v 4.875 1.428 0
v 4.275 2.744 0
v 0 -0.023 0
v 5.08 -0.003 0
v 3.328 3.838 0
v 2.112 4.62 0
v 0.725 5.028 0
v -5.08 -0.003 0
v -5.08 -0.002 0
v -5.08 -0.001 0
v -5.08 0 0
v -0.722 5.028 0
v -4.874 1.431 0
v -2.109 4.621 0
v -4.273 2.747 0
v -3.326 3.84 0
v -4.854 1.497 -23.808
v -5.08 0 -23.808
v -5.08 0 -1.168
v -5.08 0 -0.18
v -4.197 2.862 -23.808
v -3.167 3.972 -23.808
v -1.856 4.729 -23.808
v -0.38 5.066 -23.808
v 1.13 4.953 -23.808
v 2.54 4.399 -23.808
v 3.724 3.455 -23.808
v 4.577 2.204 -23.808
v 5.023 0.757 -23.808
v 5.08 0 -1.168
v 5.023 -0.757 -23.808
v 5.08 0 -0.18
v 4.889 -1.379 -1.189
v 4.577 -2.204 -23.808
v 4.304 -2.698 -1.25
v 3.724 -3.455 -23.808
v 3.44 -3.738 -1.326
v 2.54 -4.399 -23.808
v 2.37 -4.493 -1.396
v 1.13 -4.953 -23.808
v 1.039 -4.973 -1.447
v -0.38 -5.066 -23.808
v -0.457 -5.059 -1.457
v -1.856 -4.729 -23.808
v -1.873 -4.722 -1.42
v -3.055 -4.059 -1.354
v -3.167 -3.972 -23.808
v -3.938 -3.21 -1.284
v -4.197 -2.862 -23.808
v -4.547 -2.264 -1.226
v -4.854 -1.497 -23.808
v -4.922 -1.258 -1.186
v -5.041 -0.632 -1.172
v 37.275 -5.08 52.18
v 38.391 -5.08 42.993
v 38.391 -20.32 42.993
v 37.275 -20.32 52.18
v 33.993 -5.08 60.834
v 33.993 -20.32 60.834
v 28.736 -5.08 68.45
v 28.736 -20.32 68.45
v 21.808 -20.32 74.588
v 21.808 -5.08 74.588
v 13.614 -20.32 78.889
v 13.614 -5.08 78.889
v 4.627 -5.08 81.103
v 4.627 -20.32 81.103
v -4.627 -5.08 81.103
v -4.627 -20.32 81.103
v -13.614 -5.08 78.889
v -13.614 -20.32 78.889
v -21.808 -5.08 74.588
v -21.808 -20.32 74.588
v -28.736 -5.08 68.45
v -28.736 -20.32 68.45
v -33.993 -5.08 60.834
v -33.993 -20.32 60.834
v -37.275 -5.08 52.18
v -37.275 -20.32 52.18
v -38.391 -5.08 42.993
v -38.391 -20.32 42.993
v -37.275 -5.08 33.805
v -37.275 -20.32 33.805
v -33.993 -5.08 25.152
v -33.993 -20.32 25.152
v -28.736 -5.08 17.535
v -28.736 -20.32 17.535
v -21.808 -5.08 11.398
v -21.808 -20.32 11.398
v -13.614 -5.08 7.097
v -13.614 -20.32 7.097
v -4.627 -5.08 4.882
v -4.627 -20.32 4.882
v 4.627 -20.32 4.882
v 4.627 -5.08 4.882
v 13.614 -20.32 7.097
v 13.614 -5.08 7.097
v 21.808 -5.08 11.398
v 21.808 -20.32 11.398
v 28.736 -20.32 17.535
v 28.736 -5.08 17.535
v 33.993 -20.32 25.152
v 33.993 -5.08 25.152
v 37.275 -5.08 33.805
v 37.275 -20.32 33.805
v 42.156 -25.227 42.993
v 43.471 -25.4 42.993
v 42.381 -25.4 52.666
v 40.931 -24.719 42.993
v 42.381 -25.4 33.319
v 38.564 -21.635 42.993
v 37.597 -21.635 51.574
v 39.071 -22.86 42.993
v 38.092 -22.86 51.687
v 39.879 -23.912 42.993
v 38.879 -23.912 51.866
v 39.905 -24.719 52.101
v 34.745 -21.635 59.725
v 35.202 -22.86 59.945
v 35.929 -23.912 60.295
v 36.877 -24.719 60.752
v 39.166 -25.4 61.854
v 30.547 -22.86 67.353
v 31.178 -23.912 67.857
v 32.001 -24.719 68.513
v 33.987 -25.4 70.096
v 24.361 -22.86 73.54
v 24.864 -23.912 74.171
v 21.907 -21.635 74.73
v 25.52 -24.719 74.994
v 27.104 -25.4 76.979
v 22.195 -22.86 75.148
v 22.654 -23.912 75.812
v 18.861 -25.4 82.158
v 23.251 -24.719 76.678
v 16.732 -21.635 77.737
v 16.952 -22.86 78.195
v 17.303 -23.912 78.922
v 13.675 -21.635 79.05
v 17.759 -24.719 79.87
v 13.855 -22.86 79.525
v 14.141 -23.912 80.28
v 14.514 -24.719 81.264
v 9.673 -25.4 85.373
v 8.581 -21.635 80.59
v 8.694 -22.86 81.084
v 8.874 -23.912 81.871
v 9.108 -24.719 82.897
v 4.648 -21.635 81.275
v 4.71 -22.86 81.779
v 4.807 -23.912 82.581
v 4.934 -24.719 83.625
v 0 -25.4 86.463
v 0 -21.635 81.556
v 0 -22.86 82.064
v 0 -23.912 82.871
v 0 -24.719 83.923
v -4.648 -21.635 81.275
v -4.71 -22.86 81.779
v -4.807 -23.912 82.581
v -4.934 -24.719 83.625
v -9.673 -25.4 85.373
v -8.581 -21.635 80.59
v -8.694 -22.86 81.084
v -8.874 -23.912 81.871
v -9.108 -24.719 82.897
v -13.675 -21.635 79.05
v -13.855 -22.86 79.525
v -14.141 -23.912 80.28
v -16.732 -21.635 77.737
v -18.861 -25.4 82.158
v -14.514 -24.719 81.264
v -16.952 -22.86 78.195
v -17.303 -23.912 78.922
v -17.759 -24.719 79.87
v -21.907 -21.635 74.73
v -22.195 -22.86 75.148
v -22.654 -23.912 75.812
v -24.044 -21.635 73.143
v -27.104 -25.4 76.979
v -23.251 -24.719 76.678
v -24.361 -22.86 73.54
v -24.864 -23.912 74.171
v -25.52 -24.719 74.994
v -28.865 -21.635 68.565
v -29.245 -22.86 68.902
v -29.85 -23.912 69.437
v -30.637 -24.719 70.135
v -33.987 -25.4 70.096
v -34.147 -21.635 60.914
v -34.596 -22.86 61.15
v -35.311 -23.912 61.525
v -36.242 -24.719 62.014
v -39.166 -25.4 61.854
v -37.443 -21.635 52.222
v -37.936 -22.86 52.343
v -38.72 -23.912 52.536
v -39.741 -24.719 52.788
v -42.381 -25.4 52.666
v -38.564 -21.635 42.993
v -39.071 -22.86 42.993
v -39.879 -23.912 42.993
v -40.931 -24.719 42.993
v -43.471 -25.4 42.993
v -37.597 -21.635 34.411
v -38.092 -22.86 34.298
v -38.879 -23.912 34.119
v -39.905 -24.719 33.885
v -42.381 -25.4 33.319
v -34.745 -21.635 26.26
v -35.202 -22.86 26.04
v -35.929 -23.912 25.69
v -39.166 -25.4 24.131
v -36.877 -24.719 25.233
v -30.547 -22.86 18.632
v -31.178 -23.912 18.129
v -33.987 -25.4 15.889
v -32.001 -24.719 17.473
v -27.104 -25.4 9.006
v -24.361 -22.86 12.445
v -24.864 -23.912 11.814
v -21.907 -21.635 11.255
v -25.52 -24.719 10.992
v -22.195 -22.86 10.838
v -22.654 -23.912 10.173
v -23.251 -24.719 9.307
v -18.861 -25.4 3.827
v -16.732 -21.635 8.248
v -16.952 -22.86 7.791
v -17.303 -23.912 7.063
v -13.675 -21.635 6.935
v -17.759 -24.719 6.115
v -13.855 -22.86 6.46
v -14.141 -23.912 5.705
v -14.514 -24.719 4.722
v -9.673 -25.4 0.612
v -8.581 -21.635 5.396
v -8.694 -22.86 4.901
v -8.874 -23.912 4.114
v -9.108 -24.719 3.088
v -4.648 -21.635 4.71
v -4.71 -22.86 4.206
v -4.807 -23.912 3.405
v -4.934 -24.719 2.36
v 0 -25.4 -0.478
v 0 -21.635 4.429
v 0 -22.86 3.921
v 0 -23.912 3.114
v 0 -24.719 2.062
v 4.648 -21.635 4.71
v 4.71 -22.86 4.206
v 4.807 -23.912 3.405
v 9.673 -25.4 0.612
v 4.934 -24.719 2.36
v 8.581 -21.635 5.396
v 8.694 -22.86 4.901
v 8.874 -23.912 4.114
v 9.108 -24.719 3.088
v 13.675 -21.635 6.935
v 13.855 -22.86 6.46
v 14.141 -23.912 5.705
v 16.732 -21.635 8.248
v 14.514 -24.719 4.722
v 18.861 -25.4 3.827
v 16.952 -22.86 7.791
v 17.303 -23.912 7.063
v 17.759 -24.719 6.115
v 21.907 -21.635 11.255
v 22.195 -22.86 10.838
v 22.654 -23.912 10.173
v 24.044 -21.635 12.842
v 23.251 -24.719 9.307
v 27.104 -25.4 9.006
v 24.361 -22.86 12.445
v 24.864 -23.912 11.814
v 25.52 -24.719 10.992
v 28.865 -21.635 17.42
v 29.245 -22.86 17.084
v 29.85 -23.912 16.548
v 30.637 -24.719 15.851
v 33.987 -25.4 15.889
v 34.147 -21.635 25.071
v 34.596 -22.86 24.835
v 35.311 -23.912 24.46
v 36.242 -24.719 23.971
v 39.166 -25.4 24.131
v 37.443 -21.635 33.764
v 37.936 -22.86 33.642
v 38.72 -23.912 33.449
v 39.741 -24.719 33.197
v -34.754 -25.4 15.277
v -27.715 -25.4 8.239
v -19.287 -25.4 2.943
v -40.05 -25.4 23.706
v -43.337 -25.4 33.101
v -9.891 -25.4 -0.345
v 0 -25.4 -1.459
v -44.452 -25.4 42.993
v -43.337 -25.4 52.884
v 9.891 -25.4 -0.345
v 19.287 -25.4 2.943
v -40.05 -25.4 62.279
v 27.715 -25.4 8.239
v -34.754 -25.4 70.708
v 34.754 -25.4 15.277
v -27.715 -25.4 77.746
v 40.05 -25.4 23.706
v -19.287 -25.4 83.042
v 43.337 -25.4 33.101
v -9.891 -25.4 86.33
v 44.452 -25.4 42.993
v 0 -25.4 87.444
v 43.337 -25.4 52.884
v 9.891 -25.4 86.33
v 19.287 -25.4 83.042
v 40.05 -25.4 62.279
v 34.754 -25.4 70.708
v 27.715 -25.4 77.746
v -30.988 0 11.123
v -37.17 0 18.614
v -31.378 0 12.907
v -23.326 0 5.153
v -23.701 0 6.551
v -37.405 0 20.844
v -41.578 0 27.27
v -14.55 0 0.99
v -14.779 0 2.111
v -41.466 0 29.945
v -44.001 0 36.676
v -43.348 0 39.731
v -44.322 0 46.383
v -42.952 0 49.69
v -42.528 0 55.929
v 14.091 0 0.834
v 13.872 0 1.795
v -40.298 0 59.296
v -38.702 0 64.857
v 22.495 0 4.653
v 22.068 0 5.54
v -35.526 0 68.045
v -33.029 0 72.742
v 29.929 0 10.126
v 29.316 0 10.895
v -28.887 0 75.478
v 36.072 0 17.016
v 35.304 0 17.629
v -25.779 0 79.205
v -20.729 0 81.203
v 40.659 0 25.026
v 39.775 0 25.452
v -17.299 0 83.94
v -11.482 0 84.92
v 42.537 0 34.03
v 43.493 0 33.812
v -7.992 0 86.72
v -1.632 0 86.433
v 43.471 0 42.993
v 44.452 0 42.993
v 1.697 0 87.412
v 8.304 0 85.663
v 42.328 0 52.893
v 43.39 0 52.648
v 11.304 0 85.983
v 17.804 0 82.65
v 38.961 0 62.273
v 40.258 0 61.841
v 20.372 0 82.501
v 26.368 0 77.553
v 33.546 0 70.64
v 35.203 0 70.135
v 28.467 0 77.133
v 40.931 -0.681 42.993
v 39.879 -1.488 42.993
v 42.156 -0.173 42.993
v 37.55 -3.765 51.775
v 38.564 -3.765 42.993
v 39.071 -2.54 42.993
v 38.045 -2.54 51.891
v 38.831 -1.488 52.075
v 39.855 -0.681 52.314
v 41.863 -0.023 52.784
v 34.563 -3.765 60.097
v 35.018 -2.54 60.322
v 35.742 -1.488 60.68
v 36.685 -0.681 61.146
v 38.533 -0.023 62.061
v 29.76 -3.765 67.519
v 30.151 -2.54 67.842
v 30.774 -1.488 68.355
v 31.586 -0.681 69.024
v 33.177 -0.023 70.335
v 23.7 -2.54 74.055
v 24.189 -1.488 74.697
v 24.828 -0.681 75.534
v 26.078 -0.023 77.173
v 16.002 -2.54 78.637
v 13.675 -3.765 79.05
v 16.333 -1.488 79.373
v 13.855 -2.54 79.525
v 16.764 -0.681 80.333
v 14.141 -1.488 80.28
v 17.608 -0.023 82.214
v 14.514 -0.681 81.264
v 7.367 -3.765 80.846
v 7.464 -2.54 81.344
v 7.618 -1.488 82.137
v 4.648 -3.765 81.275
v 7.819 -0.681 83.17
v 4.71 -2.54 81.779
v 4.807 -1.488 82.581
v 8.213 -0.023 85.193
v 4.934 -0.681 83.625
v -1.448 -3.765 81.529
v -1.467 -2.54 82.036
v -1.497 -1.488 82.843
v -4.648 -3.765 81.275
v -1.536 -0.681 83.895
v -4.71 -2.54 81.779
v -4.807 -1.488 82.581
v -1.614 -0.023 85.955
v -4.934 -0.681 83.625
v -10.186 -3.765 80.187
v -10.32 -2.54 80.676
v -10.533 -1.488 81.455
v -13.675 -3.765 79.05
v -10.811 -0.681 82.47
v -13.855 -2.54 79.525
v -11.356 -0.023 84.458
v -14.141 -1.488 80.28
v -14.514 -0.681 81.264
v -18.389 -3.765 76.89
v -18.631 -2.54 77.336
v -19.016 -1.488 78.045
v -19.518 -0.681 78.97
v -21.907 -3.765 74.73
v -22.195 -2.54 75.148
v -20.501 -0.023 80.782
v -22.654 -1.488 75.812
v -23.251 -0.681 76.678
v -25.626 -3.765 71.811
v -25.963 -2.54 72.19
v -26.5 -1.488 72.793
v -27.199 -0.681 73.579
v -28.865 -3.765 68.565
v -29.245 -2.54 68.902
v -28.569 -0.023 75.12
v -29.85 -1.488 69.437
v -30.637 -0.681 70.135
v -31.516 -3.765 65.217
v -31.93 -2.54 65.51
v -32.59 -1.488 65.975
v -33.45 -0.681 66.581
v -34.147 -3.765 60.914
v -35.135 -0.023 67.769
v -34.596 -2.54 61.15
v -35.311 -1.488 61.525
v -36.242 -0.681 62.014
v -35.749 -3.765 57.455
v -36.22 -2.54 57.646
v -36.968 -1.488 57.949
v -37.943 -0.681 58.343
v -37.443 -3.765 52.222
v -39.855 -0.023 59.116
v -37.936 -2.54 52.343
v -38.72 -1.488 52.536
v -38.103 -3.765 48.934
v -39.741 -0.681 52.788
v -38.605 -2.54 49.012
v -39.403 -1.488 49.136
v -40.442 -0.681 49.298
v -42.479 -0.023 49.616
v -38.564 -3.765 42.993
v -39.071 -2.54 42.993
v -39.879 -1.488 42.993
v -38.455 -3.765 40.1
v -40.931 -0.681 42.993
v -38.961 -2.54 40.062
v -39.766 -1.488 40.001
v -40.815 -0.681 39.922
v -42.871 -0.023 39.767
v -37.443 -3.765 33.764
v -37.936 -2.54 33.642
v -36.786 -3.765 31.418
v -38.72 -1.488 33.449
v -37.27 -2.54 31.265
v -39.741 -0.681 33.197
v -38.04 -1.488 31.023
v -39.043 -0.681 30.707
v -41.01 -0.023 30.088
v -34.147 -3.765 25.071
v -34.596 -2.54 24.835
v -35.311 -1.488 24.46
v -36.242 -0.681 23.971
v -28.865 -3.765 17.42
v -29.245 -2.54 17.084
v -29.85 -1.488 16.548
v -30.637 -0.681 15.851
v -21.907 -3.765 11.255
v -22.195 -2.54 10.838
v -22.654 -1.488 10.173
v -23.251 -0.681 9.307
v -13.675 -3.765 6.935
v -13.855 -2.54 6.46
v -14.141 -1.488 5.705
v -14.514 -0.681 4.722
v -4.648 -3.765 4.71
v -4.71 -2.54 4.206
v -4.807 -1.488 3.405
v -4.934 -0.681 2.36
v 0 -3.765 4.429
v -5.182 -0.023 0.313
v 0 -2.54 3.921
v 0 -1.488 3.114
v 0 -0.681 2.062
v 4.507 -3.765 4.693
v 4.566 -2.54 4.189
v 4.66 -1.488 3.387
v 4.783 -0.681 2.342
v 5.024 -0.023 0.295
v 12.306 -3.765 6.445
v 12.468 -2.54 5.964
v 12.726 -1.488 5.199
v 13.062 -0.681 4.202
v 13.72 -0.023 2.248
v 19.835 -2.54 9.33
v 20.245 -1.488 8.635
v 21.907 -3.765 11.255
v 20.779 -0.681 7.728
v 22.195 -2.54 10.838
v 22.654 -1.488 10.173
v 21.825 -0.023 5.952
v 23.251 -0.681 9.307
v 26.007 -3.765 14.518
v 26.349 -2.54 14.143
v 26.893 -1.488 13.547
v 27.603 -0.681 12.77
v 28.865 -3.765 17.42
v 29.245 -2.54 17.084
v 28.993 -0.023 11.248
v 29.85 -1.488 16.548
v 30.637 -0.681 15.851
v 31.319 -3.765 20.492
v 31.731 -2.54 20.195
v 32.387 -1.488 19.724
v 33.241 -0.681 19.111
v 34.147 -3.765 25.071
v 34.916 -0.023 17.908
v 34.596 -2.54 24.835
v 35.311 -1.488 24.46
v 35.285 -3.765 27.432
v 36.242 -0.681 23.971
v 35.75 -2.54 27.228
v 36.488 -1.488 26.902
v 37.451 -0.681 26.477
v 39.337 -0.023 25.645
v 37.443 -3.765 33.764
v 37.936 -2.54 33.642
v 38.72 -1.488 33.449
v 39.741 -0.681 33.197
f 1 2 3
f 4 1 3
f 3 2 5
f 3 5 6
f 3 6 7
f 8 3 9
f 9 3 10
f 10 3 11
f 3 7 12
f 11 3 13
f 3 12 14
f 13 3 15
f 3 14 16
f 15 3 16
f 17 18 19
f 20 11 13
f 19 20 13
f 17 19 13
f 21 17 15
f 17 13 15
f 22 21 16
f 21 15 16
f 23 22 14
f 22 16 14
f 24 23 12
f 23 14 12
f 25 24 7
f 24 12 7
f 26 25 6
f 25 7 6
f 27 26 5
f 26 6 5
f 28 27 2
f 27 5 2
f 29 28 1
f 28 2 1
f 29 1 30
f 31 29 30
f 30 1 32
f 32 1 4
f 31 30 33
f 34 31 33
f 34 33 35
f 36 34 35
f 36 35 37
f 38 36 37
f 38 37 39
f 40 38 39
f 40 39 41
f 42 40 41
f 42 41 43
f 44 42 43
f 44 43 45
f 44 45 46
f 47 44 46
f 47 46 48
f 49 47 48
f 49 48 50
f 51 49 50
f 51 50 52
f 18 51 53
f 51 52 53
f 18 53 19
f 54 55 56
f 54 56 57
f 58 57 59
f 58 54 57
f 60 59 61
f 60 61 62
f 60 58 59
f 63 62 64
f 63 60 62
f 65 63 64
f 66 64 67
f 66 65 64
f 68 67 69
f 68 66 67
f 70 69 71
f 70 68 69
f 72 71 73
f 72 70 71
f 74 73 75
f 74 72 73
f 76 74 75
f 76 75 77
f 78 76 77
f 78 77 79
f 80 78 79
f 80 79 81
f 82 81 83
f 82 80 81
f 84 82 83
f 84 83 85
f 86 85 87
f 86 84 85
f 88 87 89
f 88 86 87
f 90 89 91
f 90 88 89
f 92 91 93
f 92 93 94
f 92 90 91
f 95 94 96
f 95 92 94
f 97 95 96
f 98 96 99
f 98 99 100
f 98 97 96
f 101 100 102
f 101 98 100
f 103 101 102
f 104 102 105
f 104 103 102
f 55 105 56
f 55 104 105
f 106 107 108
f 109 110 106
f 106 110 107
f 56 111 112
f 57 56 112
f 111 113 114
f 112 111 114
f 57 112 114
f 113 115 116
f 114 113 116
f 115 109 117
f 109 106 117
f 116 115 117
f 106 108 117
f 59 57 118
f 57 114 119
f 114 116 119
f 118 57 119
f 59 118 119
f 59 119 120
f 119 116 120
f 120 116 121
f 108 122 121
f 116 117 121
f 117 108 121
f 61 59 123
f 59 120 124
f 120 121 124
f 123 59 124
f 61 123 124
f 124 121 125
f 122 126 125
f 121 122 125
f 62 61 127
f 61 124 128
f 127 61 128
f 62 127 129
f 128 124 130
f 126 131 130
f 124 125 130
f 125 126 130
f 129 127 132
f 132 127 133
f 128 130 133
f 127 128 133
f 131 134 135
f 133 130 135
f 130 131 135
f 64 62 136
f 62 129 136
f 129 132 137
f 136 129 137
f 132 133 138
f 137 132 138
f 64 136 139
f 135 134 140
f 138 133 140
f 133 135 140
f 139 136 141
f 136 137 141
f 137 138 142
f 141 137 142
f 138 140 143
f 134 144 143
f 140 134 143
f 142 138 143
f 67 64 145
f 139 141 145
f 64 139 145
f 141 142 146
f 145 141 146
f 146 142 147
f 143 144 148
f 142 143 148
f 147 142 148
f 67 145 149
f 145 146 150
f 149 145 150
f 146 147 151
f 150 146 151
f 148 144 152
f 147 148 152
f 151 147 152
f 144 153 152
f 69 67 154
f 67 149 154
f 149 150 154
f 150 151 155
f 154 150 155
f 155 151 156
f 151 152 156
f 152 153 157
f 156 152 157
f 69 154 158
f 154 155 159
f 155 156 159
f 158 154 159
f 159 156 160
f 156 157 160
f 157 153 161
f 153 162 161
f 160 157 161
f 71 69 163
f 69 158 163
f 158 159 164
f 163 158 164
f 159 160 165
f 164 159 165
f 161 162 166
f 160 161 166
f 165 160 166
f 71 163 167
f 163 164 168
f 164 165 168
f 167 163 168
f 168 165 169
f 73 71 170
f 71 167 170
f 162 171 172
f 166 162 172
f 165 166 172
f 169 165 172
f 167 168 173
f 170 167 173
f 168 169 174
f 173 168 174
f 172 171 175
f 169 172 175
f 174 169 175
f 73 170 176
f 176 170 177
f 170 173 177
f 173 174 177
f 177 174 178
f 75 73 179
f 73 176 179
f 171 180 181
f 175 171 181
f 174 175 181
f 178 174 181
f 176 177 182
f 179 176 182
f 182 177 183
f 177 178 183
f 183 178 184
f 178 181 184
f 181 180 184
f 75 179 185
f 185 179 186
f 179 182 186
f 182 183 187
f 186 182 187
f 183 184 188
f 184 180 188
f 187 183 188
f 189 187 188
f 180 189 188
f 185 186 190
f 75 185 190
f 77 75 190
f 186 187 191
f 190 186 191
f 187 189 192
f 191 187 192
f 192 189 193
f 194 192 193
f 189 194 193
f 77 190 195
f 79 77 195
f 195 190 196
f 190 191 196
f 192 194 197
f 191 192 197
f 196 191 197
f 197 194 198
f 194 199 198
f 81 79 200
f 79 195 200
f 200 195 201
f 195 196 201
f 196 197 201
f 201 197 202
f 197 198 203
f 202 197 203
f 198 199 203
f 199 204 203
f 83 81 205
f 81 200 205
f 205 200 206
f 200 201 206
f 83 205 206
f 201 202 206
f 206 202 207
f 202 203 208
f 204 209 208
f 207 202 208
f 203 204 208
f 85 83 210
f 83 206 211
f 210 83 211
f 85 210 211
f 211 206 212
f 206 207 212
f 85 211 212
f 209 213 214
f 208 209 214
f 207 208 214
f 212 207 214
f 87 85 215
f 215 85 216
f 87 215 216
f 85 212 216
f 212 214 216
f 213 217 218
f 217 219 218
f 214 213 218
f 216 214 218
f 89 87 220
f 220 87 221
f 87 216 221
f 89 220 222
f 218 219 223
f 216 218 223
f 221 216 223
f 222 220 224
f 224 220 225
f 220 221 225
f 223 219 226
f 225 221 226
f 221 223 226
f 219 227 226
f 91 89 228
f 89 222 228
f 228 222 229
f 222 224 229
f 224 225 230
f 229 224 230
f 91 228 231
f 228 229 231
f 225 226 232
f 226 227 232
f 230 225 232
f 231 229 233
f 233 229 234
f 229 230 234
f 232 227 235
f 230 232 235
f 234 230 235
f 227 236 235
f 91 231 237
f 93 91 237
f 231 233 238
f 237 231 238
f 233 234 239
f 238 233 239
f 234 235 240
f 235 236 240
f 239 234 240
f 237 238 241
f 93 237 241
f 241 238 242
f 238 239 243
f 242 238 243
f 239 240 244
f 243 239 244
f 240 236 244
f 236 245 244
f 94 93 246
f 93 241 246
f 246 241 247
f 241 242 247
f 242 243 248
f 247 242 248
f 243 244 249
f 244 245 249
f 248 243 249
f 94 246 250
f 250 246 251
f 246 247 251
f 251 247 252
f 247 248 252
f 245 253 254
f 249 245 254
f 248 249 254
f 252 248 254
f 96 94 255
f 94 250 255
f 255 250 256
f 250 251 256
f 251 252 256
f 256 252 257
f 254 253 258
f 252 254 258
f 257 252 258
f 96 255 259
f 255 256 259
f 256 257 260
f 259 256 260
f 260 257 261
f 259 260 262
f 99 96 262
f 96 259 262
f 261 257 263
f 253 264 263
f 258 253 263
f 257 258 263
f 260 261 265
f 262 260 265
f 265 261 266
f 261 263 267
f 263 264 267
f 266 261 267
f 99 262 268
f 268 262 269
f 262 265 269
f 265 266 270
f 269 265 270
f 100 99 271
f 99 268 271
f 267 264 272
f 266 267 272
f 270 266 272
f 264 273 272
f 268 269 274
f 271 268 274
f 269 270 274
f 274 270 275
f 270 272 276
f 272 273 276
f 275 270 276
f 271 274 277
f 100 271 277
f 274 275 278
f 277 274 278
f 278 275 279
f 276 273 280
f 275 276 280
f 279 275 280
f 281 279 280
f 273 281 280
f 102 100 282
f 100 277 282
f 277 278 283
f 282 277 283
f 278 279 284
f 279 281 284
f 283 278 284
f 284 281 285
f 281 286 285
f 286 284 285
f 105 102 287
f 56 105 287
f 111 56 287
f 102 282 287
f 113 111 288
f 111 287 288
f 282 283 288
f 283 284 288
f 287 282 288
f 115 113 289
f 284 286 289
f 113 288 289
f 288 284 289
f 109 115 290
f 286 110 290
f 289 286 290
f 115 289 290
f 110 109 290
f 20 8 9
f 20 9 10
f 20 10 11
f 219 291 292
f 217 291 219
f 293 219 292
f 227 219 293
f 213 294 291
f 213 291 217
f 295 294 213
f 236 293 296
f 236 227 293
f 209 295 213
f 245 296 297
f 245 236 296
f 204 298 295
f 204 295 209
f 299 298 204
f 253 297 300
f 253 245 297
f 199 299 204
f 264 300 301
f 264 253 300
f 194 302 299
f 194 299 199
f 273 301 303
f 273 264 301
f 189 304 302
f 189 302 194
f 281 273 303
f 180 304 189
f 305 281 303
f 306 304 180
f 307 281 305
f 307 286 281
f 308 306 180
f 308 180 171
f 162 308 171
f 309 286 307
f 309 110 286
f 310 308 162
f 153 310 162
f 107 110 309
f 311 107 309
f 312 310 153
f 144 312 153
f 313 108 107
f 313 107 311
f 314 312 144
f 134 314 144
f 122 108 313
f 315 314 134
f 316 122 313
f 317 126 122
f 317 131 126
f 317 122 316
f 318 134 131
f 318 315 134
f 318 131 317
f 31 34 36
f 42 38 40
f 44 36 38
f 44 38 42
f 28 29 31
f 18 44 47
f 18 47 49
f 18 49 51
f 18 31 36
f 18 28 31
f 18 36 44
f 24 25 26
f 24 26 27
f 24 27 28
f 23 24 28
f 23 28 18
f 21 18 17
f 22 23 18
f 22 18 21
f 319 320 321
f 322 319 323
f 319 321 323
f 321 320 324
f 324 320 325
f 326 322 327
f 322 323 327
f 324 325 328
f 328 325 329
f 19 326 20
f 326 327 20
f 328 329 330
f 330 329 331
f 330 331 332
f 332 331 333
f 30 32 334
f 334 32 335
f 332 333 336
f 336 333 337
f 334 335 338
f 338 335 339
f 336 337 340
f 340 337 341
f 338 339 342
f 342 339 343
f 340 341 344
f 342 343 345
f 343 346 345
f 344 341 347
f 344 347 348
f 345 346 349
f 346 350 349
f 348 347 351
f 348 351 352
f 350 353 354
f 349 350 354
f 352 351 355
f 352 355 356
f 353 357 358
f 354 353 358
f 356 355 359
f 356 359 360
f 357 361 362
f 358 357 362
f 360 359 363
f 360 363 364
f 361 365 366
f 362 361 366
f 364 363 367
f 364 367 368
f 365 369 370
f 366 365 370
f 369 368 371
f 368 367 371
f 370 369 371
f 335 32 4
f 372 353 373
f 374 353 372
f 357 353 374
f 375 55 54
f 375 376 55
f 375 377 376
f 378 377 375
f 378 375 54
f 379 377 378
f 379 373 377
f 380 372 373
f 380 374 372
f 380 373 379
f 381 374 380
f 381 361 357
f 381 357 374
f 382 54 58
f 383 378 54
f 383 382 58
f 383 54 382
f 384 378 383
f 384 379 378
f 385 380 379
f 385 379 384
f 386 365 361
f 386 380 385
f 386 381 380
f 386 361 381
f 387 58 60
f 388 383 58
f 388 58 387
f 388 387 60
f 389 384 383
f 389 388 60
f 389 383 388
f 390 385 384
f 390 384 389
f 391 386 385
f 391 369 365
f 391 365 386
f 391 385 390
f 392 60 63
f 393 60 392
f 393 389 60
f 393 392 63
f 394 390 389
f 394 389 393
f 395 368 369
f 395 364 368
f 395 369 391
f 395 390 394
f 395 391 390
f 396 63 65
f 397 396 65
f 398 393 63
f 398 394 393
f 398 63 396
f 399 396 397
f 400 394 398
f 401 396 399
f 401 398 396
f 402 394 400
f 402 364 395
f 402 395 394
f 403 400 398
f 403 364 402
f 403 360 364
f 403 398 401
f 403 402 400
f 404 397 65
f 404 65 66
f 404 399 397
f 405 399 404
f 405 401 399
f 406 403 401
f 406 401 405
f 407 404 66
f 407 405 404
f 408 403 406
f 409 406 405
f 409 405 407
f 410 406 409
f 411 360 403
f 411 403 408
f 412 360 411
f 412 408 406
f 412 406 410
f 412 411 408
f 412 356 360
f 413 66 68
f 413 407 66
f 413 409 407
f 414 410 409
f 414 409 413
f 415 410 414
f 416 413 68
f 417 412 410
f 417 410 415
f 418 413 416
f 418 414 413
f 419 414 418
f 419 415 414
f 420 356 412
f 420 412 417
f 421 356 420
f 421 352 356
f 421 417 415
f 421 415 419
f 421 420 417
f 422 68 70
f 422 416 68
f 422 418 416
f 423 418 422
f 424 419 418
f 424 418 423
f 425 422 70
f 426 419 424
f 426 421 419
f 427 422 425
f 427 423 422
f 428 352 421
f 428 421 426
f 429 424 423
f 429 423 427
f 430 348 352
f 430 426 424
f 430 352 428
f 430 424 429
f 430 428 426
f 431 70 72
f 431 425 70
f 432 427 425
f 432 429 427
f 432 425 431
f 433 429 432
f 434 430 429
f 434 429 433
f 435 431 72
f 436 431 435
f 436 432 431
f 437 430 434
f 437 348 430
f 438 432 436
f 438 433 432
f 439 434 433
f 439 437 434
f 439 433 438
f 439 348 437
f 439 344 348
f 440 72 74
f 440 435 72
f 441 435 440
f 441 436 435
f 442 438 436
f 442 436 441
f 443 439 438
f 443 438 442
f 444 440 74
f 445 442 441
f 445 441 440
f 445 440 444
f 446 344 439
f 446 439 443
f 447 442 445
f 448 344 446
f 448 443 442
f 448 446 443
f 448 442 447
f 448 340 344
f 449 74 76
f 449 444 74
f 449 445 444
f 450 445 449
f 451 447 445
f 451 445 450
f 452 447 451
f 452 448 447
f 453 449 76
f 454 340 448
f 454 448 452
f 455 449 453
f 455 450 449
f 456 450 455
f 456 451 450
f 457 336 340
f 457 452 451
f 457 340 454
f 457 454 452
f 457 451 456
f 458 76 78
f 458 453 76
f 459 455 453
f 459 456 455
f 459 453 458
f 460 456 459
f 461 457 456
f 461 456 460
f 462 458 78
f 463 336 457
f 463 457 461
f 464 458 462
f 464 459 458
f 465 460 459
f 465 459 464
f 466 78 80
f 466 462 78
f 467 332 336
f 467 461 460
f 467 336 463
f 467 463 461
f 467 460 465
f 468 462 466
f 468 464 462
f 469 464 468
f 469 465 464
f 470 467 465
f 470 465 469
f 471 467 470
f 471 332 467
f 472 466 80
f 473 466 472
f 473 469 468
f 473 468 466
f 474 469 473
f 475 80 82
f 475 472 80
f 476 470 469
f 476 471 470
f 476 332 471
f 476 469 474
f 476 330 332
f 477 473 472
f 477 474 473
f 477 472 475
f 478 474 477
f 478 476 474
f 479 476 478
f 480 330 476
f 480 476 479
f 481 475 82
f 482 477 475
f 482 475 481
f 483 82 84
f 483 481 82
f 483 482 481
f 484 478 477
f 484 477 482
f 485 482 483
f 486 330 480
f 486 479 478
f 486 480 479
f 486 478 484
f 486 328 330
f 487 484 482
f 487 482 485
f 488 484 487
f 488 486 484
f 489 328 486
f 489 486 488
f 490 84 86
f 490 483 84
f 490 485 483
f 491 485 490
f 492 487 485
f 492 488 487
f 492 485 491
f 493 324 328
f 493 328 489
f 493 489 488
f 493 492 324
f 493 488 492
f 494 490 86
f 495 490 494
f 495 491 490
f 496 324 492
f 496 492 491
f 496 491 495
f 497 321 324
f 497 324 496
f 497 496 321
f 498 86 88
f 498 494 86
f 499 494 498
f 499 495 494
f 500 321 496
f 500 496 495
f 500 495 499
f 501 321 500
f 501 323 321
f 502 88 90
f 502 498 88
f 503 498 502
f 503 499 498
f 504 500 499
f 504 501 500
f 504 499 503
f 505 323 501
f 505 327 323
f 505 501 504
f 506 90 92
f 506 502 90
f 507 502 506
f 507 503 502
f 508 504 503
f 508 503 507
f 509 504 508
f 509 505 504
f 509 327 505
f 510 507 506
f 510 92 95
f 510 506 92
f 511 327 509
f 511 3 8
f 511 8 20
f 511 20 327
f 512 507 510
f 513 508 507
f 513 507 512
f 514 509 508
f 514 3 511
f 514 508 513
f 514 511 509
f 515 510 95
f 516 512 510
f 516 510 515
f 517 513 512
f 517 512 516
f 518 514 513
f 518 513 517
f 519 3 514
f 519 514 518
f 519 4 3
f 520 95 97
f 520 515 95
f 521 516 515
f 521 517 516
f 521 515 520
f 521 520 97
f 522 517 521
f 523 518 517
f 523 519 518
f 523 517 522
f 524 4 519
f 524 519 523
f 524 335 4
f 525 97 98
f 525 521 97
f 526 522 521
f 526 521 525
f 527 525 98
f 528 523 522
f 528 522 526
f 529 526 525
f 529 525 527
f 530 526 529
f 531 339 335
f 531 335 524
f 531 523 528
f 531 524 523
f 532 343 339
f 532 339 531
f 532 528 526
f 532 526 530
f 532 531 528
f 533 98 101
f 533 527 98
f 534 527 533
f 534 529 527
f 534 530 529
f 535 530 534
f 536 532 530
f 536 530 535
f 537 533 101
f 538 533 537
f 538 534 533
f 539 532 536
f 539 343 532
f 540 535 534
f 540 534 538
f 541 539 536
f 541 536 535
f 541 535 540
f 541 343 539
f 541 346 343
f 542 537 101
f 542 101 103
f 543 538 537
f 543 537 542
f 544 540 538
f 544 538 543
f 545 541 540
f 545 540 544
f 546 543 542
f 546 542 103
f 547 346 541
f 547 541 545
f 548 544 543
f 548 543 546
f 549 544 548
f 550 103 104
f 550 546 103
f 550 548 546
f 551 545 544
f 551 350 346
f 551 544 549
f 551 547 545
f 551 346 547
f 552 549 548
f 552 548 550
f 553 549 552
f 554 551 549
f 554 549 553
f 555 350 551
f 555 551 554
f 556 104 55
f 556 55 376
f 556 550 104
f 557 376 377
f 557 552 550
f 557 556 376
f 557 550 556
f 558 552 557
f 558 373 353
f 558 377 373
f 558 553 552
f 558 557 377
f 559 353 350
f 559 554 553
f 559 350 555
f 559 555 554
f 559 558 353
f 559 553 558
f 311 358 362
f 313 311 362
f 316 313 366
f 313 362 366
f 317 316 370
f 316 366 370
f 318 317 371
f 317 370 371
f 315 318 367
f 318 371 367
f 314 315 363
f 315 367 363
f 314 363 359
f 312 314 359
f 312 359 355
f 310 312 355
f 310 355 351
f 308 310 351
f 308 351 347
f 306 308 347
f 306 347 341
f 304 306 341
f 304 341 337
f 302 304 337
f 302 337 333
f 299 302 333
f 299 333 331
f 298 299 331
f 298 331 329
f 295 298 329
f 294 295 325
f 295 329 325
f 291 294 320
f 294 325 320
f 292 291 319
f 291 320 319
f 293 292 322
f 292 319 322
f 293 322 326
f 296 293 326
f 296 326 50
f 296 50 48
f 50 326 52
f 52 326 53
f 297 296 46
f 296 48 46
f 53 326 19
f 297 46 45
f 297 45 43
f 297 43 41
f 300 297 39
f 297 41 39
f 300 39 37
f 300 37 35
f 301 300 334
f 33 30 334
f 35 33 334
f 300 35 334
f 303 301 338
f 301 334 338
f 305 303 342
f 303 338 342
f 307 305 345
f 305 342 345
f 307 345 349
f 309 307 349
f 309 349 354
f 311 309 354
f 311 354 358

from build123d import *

# Parameters (mm, degrees)
F0_R     = 44.451674
F0_R_2   = 38.390752
F1_DEPTH = 25.4
F2_R     = 5.08
F3_W     = 5.08
F3_H     = 23.807657


with BuildPart() as f1:
    # F0 (on Front) → F1 (new body)
    with BuildSketch(Plane.XZ):
        with Locations((0, 42.992625)):
            Circle(F0_R)
        with Locations((0, 42.992625)):
            Circle(F0_R_2, mode=Mode.SUBTRACT)
    extrude(amount=F1_DEPTH)

    # F2
    f2_edges = [f1.edges().sort_by_distance(p)[0] for p in [
        (-38.390752, -25.4, 42.992625),
        (-38.390752, 0, 42.992625),
    ]]
    fillet(f2_edges, radius=F2_R)

    # F3 (on Front) → F4 (revolve)
    with BuildSketch(Plane.XZ):
        with Locations((-2.54, -11.903828)):
            Rectangle(F3_W, F3_H)
    revolve(axis=Axis((0, 0, -11.903828), (0, 0, -1)))


solid = f1.part
